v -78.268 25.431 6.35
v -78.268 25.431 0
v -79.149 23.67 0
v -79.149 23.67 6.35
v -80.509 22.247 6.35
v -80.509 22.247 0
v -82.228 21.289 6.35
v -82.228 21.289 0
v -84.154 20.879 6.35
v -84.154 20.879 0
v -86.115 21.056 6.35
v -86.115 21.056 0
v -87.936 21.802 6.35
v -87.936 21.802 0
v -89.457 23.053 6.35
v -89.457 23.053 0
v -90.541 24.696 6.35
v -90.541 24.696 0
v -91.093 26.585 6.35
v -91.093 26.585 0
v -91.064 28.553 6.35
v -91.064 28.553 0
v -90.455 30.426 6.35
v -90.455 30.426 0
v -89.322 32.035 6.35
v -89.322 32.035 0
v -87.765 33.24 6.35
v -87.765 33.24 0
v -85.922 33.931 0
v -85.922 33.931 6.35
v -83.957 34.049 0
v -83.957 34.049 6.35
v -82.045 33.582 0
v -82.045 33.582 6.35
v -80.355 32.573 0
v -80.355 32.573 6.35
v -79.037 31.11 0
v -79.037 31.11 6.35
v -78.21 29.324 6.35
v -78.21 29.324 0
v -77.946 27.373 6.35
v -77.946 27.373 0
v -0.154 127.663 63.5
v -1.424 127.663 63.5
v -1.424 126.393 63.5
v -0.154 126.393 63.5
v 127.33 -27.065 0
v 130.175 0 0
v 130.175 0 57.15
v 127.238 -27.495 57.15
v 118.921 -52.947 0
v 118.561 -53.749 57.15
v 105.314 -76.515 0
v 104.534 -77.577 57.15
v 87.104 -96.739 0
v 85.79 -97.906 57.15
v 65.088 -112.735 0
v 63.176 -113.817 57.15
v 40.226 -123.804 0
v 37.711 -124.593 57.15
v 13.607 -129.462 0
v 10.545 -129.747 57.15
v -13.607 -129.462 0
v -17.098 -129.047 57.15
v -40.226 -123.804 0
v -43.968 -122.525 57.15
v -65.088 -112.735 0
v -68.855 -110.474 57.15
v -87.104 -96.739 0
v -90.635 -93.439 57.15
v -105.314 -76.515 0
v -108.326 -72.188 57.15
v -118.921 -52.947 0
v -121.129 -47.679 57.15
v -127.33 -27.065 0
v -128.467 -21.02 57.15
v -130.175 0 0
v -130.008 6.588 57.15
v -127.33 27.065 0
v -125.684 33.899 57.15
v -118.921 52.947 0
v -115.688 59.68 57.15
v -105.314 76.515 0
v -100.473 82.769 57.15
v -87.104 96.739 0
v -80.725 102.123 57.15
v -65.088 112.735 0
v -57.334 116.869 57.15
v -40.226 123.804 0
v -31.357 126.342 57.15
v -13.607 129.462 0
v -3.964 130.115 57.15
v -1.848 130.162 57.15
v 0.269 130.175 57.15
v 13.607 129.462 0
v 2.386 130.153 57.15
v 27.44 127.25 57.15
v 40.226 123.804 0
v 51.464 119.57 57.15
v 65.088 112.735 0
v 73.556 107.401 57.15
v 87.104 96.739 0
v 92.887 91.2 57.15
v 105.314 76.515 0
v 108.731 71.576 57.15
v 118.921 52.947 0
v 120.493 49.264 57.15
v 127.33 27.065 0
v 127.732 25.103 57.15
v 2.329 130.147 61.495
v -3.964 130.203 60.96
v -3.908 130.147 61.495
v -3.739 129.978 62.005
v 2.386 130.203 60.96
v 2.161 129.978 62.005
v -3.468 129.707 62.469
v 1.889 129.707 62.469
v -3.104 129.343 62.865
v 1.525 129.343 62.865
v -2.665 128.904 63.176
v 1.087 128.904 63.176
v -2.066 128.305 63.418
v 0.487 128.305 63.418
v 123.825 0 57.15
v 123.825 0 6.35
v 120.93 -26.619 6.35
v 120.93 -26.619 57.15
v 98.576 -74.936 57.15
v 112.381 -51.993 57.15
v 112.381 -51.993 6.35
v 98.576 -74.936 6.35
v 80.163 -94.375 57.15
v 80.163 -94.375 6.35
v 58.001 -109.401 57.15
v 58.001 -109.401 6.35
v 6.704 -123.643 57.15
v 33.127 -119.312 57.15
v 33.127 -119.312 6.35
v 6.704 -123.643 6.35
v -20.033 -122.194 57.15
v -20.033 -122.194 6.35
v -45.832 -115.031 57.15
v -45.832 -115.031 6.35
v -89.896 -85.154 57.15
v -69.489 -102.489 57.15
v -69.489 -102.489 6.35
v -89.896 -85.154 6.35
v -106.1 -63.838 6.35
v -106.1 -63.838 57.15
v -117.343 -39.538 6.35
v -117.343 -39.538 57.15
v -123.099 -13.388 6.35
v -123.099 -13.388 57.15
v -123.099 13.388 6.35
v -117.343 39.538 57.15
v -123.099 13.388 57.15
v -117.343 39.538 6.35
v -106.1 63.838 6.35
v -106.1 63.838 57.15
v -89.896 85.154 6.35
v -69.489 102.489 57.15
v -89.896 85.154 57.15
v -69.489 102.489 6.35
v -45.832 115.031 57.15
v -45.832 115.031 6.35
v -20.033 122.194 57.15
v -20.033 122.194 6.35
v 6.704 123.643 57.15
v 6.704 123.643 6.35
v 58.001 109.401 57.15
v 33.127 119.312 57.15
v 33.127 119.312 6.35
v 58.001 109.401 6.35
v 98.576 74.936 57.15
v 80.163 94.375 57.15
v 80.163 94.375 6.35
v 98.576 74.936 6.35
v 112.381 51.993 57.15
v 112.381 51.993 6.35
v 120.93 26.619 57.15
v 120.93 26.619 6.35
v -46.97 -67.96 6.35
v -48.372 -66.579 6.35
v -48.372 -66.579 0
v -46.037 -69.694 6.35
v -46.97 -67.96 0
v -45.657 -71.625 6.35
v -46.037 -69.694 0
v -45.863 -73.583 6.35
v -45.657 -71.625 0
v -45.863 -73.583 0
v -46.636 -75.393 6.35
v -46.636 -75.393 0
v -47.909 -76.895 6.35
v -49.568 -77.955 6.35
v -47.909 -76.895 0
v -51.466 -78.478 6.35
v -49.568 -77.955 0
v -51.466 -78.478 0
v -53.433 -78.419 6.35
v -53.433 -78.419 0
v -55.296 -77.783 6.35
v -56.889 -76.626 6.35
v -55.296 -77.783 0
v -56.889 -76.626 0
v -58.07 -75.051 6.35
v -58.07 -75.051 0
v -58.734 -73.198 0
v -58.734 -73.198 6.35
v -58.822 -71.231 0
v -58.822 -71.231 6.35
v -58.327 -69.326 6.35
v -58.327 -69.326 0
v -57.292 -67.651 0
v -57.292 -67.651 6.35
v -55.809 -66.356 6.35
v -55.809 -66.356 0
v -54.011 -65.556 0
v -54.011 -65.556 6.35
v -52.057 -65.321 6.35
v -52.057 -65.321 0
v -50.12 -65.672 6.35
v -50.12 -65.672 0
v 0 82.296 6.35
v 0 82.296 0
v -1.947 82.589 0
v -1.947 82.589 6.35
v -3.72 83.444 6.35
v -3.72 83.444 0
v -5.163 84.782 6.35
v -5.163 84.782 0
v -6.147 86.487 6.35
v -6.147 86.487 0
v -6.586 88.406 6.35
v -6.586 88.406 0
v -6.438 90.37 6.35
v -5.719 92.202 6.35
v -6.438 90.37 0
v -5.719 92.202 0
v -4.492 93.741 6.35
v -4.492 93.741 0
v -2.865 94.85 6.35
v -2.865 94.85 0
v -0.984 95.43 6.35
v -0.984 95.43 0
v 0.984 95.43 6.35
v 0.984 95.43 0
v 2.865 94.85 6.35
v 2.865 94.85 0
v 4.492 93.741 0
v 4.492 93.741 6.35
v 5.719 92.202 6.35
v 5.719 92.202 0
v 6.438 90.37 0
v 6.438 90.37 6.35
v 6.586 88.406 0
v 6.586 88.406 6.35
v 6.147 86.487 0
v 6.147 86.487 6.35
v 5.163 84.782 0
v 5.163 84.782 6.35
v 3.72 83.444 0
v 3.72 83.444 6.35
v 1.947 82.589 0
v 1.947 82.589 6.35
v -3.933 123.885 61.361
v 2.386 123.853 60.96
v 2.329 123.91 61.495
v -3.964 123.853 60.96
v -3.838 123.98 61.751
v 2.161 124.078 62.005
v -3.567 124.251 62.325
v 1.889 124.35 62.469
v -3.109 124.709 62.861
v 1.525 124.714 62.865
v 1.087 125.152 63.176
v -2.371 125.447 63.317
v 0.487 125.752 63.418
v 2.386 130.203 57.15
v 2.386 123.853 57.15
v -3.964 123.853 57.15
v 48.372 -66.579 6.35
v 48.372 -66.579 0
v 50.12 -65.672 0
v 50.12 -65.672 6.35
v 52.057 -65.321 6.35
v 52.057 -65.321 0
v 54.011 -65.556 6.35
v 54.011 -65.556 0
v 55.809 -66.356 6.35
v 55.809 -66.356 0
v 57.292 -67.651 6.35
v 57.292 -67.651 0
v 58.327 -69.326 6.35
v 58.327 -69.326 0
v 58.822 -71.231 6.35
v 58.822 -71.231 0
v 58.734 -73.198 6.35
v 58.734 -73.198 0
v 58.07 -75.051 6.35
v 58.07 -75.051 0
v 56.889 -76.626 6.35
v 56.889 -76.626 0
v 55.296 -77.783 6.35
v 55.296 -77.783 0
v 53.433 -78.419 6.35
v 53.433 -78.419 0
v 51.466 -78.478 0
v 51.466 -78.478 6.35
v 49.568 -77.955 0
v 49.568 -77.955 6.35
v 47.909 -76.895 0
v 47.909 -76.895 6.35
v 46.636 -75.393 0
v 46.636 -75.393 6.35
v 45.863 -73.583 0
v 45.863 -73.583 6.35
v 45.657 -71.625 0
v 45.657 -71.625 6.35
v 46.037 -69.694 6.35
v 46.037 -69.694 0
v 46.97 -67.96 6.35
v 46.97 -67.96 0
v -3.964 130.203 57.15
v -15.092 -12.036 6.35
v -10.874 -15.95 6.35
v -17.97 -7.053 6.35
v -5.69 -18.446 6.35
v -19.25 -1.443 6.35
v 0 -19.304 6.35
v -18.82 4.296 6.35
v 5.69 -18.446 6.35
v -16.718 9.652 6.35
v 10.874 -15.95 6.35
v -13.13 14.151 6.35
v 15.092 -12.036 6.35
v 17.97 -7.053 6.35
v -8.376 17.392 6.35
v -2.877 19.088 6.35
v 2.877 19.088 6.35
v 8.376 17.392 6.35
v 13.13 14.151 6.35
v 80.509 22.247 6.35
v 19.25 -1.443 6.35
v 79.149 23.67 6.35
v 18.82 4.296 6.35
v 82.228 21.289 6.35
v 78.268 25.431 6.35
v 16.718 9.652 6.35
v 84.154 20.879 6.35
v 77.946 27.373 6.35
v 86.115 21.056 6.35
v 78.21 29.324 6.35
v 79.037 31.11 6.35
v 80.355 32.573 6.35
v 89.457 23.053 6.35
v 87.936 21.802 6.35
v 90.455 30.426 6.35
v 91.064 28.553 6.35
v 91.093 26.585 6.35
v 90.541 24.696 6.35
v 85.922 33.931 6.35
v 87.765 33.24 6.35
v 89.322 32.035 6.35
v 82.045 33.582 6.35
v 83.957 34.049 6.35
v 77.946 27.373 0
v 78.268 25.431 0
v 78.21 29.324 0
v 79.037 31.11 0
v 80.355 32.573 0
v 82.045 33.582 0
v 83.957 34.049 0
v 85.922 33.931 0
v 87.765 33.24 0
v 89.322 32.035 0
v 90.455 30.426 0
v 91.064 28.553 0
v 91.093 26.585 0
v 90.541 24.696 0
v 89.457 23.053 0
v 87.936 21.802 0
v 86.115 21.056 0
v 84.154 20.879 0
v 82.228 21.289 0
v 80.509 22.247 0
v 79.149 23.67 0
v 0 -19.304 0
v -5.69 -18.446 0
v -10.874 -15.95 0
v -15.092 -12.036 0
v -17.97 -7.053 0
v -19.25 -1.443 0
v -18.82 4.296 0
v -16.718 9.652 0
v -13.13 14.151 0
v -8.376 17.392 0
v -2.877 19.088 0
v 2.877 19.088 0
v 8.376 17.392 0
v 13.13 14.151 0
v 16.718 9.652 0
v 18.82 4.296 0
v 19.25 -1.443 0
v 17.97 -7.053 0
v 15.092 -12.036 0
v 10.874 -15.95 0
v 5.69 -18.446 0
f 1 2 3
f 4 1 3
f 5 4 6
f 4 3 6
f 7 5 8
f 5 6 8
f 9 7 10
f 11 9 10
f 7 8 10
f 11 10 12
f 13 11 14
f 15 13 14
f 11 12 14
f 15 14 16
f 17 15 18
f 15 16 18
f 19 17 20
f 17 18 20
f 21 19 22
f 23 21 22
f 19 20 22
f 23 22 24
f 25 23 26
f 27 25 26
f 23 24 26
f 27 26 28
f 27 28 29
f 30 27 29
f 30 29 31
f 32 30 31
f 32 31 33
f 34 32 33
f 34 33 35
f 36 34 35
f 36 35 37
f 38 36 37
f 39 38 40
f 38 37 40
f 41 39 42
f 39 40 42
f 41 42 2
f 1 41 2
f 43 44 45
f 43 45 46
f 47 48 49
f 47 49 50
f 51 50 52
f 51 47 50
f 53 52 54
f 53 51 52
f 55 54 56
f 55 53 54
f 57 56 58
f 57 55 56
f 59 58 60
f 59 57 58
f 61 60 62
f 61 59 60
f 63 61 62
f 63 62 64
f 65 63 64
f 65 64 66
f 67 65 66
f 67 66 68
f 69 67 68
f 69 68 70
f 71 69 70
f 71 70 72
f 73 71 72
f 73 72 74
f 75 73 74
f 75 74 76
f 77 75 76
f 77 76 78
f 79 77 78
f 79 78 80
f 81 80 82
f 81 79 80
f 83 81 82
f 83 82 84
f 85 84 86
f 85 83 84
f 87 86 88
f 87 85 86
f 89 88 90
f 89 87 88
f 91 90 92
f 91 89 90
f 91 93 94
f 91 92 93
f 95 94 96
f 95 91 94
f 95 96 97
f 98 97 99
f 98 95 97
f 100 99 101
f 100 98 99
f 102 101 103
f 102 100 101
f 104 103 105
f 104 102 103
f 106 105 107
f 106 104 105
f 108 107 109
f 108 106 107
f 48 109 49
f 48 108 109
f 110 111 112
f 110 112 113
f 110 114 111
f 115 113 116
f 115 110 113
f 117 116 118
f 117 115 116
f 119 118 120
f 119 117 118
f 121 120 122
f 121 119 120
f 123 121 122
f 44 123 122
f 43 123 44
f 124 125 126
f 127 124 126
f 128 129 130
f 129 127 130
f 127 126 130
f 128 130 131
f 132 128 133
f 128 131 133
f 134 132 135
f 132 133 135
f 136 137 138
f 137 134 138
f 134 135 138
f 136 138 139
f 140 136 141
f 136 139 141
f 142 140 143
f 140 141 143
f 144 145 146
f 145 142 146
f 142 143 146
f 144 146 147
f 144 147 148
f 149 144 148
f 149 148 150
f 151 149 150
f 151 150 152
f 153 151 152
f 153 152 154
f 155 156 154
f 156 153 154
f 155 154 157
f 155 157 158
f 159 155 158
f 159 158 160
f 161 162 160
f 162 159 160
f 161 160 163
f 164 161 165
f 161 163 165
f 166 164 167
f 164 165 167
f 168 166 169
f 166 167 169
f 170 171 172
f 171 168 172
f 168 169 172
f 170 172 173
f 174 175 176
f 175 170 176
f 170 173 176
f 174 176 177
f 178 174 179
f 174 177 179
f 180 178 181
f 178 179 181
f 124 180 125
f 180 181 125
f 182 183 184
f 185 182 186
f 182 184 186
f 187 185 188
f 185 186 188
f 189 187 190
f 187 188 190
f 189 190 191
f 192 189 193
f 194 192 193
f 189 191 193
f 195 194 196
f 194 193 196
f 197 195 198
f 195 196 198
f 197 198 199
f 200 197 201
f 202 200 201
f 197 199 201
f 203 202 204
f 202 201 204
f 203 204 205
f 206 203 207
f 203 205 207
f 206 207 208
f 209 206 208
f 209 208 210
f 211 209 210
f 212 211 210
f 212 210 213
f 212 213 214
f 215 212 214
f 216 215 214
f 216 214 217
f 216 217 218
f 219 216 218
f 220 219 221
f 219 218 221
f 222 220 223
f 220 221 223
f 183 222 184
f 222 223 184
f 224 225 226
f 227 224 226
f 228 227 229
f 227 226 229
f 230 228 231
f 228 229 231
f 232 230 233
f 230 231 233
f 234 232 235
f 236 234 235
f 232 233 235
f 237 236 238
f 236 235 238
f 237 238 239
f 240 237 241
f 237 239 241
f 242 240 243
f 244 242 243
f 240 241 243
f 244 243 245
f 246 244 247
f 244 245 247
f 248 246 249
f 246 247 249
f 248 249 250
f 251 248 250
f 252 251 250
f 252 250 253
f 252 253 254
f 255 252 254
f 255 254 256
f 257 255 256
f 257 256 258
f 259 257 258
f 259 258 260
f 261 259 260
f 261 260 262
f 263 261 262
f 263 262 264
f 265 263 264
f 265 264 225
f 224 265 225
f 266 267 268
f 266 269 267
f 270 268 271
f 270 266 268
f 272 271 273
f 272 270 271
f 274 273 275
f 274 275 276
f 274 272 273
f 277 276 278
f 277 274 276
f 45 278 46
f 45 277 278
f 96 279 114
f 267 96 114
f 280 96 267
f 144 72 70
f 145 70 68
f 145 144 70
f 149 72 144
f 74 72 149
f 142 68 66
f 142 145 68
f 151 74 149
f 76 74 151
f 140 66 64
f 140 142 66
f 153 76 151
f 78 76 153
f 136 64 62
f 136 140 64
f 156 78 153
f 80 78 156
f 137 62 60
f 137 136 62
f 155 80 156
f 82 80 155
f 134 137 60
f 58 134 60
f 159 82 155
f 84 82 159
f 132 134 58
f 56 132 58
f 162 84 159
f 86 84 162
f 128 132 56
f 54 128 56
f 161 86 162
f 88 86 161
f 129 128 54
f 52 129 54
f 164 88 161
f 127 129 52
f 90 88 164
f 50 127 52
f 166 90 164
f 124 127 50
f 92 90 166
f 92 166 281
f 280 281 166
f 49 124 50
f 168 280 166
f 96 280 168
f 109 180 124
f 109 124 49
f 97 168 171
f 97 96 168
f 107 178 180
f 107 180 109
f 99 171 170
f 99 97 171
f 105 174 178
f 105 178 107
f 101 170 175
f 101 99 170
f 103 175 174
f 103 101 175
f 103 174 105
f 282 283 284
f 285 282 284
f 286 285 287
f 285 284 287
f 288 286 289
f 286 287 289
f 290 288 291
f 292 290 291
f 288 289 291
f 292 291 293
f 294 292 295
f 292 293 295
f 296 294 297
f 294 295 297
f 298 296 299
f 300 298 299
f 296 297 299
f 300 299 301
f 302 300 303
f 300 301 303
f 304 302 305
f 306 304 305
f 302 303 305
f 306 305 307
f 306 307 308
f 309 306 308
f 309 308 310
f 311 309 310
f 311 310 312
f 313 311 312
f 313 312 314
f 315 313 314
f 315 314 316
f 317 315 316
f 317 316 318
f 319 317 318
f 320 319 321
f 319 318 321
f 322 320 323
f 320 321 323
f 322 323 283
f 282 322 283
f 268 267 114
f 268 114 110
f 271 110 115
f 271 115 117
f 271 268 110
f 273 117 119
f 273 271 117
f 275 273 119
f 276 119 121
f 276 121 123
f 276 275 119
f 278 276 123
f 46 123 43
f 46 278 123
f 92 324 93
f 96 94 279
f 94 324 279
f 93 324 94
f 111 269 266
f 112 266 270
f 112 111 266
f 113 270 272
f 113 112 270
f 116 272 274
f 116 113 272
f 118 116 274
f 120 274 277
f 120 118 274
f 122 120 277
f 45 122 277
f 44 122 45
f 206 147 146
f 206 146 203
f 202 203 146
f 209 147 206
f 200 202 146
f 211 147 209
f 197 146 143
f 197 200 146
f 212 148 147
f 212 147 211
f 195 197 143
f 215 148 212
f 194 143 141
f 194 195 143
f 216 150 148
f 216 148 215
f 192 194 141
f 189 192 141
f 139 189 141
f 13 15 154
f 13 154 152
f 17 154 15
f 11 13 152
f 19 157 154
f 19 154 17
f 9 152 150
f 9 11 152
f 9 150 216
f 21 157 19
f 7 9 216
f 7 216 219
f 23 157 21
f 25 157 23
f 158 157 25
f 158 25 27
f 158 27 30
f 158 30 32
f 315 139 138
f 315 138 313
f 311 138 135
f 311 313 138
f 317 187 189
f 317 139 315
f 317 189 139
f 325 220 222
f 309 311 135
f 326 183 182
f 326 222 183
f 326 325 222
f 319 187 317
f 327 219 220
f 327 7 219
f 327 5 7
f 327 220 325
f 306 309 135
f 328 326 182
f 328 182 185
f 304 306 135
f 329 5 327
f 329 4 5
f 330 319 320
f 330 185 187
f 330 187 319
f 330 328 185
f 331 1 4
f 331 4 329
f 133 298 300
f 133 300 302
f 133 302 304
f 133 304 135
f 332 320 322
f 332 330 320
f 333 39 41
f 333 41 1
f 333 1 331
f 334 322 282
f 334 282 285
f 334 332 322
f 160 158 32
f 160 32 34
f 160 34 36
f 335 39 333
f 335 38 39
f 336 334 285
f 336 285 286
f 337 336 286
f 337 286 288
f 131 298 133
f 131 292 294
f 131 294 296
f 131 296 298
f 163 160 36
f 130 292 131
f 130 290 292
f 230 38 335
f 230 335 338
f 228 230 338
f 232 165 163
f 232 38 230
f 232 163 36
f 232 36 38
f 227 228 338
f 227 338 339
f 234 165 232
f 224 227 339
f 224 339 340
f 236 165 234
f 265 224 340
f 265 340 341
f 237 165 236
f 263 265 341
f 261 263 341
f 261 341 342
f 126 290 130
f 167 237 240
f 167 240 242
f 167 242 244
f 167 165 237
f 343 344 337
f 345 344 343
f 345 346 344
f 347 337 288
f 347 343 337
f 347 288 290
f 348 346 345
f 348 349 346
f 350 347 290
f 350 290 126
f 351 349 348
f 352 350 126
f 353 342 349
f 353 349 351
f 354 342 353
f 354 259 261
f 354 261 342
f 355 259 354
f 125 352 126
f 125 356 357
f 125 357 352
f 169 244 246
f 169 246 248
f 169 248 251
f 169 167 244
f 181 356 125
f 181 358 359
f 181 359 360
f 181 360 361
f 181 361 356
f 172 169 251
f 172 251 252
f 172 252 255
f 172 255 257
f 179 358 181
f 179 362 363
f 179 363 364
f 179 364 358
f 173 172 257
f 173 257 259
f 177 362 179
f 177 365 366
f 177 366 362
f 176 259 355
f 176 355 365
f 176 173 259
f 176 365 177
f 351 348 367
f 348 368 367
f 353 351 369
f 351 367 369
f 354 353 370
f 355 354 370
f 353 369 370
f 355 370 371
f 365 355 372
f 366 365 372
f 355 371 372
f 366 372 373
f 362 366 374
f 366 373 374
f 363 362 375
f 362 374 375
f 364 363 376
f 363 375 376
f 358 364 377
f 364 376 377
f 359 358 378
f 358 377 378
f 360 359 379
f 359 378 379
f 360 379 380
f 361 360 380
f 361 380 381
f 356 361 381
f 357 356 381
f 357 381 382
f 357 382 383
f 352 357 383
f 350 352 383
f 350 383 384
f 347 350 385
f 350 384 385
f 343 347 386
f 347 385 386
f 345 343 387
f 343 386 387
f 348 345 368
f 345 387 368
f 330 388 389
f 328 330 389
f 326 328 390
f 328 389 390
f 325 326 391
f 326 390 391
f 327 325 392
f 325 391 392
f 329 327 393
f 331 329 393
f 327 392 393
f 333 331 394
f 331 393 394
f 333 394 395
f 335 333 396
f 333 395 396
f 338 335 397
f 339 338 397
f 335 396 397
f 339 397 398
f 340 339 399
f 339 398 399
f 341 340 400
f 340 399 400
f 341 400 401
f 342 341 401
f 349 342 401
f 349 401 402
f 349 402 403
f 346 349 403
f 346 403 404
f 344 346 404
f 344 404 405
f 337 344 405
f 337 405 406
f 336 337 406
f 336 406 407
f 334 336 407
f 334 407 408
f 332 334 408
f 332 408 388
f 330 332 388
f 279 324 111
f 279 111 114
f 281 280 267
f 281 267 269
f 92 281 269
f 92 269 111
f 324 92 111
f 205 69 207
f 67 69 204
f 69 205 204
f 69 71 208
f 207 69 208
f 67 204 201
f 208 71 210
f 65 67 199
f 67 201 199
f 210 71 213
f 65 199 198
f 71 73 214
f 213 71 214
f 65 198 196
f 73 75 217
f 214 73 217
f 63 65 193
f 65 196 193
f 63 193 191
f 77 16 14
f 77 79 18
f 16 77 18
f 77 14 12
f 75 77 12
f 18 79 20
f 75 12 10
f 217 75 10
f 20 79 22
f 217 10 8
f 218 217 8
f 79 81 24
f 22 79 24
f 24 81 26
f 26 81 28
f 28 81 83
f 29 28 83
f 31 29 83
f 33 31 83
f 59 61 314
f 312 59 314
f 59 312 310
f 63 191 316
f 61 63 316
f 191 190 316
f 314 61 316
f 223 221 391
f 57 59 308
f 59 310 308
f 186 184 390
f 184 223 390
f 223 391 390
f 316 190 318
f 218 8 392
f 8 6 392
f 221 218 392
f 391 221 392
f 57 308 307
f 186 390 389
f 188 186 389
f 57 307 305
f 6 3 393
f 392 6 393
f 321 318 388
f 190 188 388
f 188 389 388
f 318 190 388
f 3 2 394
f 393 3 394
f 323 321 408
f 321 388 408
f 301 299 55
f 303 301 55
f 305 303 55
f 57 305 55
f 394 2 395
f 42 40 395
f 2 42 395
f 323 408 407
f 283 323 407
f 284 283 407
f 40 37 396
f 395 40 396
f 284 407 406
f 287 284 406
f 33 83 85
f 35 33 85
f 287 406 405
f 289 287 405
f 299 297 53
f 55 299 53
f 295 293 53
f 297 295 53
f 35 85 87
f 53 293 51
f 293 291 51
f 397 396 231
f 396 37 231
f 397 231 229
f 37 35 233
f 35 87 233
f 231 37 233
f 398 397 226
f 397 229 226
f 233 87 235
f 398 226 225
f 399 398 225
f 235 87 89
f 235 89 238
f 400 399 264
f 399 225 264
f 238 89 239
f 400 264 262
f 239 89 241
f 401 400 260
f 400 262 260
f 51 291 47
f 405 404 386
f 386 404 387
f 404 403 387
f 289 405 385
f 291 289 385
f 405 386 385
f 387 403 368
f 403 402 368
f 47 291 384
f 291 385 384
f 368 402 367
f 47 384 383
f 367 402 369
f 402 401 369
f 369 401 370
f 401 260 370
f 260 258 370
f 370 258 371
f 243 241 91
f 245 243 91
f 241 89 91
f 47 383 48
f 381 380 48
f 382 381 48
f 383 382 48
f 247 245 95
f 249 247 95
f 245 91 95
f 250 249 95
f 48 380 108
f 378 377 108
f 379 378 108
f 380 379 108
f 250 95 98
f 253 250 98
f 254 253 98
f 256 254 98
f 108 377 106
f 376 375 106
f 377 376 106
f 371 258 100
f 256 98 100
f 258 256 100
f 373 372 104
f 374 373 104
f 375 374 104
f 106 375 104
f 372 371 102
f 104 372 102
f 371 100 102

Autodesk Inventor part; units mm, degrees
ref_plane "YZ Plane" through (0, 0, 0) normal (1, 0, 0) x (0, 1, 0)
ref_plane "XZ Plane" through (0, 0, 0) normal (0, 1, 0) x (-1, 0, 0)
ref_plane "XY Plane" through (0, 0, 0) normal (0, 0, 1) x (1, 0, 0)
sketch "Sketch1" plane through (0, 0, 0) normal (0, 0, 1) x (1, 0, 0)
  circle A0 centre (0, 0) radius 130.175
  dimension "d0" = 260.35
extrude "Extrusion1" add sketch "Sketch1" along normal blind 6.35
sketch "Sketch2" plane through (0, 0, 6.35) normal (0, 0, 1) x (1, 0, 0)
  circle A0 centre (0, 0) radius 130.175 projected
  circle A1 centre (0, 0) radius 123.825
  dimension "d3" = 6.35
extrude "Extrusion2" add sketch "Sketch2" along normal blind 50.8
sketch "Sketch4" plane through (0, 0, 6.35) normal (0, 0, 1) x (1, 0, 0)
  point P0 (0, 0)
  point P1 (0, 0)
hole "Hole1" at (0, 0, 6.35) direction (0, 0, -1) diameter 38.608 end through all
sketch "Sketch5" plane through (0, 0, 6.35) normal (0, 0, 1) x (1, 0, 0)
  point P0 (0, 0)
  point P1 (0, 88.9)
  dimension "d13" = 88.9
hole "Hole2" at (0, 88.9, 6.35) direction (0, 0, -1) diameter 13.208 end through all
pattern_circular "Circular Pattern1" count 5 over 360 about axis through (0, 0, -366.2495) along (0, 0, 1) of "Hole2"
sketch "Sketch7" plane through (-0.7894, 85.7534, 57.15) normal (0, 0, 1) x (1, 0, 0)
  line L0 (-3.175, 44.45) -> (3.175, 44.45)
  line L1 (3.175, 44.45) -> (3.175, 38.1)
  line L2 (3.175, 38.1) -> (-3.175, 38.1)
  line L3 (-3.175, 38.1) -> (-3.175, 44.45)
  point P0 (0, 0)
  dimension "d35" = 6.35
  dimension "d36" = 6.35
  dimension "d33" = 3.175
  dimension "d34" = 44.45
extrude "Extrusion4" add sketch "Sketch7" along normal blind 6.35
fillet "Fillet1" radius 2.54 4 edges at (-0.7894, 130.2034, 63.5) (2.3856, 127.0284, 63.5) (-0.7894, 123.8534, 63.5) (-3.9644, 127.0284, 63.5)
equation "\"d0\" = W_innerDiameter + W_wallThickness"
equation "\"d1\" = W_wallThickness"
equation "\"d3\" = W_wallThickness"
equation "\"d4\" = W_innerDepth"
equation "\"d6\" = W_innerGearHoleDiameter"
equation "\"d13\" = OG_distanceFromCenter"
equation "\"d14\" = W_outerGearHoleDiameter"
equation "\"d33\" = 0.5 * d35"
equation "\"d34\" = 0.35 * d40"
equation "\"d39\" = d41"
equation "\"W_wallThickness\" = 6.35"
equation "\"W_innerDepth\" = 50.8"
equation "\"W_innerGearHoleDiameter\" = 38.608"
equation "\"W_outerGearHoleDiameter\" = 13.208"
equation "\"OG_distanceFromCenter\" = 88.9"
equation "\"W_innerDiameter\" = 254"
equation "\"Wheel_Related_W_\" = 0"
equation "\"W_holesClearance\" = 0.254"
equation "\"TempSpotReserved7\" = 0"
equation "\"TempSpotReserved8\" = 0"
equation "\"TempSpotReserved9\" = 0"
equation "\"TempSpotReserved10\" = 0"
equation "\"TempSpotReserved11\" = 0"
equation "\"TempSpotReserved12\" = 0"
equation "\"TempSpotReserved13\" = 0"
equation "\"TempSpotReserved14\" = 0"
equation "\"TempSpotReserved15\" = 0"
equation "\"TempSpotReserved16\" = 0"
equation "\"TempSpotReserved17\" = 0"
equation "\"TempSpotReserved18\" = 0"
equation "\"TempSpotReserved19\" = 0"
equation "\"TempSpotReserved20\" = 0"
equation "\"Inner_Gear_Related_IG_\" = 0"
equation "\"IG_shaftDiameter\" = 25.4"
equation "\"IG_gearDiameter\" = 127"
equation "\"IG_shaftLength\" = 127"
equation "\"IG_gearThickness\" = 6.35"
equation "\"TempSpotReserved25\" = 0"
equation "\"TempSpotReserved26\" = 0"
equation "\"TempSpotReserved27\" = 0"
equation "\"TempSpotReserved28\" = 0"
equation "\"TempSpotReserved29\" = 0"
equation "\"TempSpotReserved30\" = 0"
equation "\"TempSpotReserved31\" = 0"
equation "\"TempSpotReserved32\" = 0"
equation "\"TempSpotReserved33\" = 0"
equation "\"TempSpotReserved34\" = 0"
equation "\"TempSpotReserved35\" = 0"
equation "\"TempSpotReserved36\" = 0"
equation "\"TempSpotReserved37\" = 0"
equation "\"TempSpotReserved38\" = 0"
equation "\"TempSpotReserved39\" = 0"
equation "\"TempSpotReserved40\" = 0"
equation "\"Outer_Gear_Related_OG_\" = 0"
equation "\"OG_shaftDiameter\" = 12.7"
equation "\"OG_gearDiameter\" = 50.8"
equation "\"OG_shaftLength\" = 57.15"
equation "\"OG_gearThickness\" = 6.35"
equation "\"TempSpotReserved47\" = 0"
equation "\"TempSpotReserved48\" = 0"
equation "\"TempSpotReserved49\" = 0"
equation "\"TempSpotReserved50\" = 0"
equation "\"TempSpotReserved51\" = 0"
equation "\"TempSpotReserved52\" = 0"
equation "\"TempSpotReserved53\" = 0"
equation "\"TempSpotReserved54\" = 0"
equation "\"TempSpotReserved55\" = 0"
equation "\"TempSpotReserved56\" = 0"
equation "\"TempSpotReserved57\" = 0"
equation "\"TempSpotReserved58\" = 0"
equation "\"TempSpotReserved59\" = 0"
equation "\"TempSpotReserved60\" = 0"
equation "\"Leg_Extensions_Related_LE_\" = 0"
equation "\"LE_baseDiameter\" = 19.05"
equation "\"LE_maxLength\" = 93.92488"
equation "\"LE_thickness\" = 19.05"
equation "\"IG_ratioToOuterGear\" = 2.5"
equation "\"B_bearingThickness\" = 6.35"
equation "\"TempSpotReserved43\" = 0"
equation "\"TempSpotReserved45\" = 0"
equation "\"Thisisatest\" = 25.4"
equation "\"TempSpotReserved46\" = 0"
equation "\"TempSpotReserved44\" = 0"
equation "\"LE_offsetAboveOuterGear\" = 0"
equation "\"Bearing_Related_B_\" = 0"
equation "\"TempSpotReserved42\" = 0"
equation "\"d41\" = 6.35"
equation "\"d40\" = 127"
properties part number "Wheel_1"
